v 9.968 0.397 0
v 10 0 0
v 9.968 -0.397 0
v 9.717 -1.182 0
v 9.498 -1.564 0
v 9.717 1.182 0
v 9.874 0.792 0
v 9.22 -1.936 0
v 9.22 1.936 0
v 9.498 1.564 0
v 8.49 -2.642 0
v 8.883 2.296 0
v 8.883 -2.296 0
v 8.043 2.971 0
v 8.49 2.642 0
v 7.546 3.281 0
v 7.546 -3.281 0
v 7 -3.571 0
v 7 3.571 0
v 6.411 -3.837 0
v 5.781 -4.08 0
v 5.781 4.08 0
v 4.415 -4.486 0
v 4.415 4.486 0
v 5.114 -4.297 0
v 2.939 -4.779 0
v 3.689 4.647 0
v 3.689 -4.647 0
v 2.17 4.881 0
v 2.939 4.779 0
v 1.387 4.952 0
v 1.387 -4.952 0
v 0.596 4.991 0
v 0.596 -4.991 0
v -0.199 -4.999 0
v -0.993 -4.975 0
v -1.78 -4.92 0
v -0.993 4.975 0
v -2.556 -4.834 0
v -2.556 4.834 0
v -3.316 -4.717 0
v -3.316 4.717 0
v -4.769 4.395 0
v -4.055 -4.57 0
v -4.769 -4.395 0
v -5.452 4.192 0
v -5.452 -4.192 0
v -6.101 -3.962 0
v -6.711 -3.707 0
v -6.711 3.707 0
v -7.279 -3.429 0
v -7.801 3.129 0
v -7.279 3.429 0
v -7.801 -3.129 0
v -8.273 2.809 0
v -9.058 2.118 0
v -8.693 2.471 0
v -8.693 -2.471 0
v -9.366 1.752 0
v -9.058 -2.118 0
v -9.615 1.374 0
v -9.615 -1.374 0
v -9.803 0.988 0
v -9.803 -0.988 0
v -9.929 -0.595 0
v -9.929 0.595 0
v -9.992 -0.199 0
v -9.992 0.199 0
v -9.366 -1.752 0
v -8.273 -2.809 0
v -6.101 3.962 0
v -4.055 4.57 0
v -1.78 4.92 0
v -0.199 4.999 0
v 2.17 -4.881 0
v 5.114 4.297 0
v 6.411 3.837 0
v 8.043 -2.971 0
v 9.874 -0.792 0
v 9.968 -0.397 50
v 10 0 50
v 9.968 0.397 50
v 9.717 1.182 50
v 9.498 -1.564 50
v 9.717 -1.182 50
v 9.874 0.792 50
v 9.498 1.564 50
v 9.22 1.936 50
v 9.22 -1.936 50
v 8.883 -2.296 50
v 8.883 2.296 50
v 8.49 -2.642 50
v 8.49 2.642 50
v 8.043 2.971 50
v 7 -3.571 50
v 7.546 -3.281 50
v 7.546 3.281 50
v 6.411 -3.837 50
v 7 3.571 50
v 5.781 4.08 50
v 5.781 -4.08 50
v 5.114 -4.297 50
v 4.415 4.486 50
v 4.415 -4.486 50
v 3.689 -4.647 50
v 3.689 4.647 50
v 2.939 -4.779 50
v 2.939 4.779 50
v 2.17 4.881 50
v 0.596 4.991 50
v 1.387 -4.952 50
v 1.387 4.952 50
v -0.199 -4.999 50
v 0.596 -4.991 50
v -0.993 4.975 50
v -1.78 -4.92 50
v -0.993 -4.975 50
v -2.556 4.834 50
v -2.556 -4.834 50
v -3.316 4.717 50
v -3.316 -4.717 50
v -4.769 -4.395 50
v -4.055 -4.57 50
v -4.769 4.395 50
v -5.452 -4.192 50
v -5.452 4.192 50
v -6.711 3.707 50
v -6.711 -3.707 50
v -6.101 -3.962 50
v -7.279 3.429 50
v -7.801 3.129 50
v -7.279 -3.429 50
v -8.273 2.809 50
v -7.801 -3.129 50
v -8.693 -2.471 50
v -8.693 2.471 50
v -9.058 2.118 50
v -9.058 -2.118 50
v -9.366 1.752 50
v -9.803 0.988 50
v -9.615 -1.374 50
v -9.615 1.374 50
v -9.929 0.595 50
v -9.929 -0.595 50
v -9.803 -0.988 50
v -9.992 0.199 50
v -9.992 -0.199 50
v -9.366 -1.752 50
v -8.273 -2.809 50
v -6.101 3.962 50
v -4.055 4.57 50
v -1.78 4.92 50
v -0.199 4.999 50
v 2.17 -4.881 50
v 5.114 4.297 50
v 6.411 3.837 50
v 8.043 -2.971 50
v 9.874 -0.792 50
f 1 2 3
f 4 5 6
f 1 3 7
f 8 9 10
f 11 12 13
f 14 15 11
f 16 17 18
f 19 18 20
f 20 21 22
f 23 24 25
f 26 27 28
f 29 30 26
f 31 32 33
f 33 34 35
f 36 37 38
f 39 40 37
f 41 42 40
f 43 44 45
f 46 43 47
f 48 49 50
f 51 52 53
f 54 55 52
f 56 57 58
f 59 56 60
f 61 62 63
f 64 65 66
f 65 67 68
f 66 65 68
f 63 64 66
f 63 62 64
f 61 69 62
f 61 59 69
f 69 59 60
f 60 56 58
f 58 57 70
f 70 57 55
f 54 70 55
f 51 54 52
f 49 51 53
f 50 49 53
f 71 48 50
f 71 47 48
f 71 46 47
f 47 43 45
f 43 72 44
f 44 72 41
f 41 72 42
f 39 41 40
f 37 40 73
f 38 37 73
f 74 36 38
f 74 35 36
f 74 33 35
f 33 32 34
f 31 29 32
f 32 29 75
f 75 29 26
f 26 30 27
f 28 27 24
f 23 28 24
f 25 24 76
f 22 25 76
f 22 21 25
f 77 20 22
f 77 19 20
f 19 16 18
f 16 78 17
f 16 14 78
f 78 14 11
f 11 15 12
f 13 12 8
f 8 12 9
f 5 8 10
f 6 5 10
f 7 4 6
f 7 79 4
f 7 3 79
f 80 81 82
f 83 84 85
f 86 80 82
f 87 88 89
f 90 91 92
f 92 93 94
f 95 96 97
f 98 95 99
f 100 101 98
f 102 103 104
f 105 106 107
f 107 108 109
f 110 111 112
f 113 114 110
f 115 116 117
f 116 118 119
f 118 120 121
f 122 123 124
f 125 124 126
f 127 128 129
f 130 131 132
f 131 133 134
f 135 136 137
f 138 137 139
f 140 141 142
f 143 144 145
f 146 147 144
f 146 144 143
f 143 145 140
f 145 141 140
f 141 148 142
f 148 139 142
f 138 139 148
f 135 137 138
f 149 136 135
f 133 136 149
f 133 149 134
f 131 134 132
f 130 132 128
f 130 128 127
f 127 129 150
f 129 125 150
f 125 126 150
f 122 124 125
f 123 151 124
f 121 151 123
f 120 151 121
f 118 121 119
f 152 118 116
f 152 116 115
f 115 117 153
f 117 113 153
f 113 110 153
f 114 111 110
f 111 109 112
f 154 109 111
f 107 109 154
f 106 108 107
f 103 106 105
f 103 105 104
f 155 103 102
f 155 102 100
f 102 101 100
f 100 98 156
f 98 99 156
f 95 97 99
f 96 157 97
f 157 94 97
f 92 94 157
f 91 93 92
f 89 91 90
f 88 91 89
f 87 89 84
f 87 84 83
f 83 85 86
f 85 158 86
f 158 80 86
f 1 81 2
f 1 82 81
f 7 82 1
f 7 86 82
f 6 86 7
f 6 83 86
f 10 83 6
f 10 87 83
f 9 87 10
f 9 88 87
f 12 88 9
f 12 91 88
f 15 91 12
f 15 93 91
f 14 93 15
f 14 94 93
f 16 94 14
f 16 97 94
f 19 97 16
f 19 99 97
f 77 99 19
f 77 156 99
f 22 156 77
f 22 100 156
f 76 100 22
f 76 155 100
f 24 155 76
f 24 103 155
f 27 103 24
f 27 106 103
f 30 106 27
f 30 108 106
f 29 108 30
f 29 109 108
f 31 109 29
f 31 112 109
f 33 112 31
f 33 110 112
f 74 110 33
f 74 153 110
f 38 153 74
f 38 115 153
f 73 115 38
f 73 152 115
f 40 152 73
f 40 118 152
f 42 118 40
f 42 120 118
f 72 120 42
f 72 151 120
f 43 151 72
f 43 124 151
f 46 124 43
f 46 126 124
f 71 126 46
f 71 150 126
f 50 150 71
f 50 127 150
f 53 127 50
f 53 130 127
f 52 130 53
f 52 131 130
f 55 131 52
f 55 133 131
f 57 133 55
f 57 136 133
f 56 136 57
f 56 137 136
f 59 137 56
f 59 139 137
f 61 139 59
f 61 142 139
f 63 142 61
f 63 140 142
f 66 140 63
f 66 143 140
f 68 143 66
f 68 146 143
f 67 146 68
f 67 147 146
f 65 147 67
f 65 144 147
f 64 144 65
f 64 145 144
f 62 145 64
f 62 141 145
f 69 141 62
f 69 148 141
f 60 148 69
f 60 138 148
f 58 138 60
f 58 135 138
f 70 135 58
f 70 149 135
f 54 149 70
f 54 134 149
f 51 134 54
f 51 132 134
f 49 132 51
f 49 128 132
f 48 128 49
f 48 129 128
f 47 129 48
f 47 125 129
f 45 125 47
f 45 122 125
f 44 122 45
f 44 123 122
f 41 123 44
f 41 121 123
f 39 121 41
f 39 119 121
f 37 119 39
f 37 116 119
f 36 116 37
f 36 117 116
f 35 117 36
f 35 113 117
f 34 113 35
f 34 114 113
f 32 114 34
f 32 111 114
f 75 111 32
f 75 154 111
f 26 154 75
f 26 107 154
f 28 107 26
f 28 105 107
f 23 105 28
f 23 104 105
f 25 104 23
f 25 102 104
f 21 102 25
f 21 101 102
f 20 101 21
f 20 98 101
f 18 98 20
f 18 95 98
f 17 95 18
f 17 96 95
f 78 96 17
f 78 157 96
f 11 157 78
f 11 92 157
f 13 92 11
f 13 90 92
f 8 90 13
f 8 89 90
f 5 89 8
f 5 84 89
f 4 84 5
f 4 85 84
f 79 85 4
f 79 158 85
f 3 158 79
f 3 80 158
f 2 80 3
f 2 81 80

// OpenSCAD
$fa = 1;
$fs = 0.4;
linear_extrude(height=50)
    scale([2,1,1])
    circle(d=10);
